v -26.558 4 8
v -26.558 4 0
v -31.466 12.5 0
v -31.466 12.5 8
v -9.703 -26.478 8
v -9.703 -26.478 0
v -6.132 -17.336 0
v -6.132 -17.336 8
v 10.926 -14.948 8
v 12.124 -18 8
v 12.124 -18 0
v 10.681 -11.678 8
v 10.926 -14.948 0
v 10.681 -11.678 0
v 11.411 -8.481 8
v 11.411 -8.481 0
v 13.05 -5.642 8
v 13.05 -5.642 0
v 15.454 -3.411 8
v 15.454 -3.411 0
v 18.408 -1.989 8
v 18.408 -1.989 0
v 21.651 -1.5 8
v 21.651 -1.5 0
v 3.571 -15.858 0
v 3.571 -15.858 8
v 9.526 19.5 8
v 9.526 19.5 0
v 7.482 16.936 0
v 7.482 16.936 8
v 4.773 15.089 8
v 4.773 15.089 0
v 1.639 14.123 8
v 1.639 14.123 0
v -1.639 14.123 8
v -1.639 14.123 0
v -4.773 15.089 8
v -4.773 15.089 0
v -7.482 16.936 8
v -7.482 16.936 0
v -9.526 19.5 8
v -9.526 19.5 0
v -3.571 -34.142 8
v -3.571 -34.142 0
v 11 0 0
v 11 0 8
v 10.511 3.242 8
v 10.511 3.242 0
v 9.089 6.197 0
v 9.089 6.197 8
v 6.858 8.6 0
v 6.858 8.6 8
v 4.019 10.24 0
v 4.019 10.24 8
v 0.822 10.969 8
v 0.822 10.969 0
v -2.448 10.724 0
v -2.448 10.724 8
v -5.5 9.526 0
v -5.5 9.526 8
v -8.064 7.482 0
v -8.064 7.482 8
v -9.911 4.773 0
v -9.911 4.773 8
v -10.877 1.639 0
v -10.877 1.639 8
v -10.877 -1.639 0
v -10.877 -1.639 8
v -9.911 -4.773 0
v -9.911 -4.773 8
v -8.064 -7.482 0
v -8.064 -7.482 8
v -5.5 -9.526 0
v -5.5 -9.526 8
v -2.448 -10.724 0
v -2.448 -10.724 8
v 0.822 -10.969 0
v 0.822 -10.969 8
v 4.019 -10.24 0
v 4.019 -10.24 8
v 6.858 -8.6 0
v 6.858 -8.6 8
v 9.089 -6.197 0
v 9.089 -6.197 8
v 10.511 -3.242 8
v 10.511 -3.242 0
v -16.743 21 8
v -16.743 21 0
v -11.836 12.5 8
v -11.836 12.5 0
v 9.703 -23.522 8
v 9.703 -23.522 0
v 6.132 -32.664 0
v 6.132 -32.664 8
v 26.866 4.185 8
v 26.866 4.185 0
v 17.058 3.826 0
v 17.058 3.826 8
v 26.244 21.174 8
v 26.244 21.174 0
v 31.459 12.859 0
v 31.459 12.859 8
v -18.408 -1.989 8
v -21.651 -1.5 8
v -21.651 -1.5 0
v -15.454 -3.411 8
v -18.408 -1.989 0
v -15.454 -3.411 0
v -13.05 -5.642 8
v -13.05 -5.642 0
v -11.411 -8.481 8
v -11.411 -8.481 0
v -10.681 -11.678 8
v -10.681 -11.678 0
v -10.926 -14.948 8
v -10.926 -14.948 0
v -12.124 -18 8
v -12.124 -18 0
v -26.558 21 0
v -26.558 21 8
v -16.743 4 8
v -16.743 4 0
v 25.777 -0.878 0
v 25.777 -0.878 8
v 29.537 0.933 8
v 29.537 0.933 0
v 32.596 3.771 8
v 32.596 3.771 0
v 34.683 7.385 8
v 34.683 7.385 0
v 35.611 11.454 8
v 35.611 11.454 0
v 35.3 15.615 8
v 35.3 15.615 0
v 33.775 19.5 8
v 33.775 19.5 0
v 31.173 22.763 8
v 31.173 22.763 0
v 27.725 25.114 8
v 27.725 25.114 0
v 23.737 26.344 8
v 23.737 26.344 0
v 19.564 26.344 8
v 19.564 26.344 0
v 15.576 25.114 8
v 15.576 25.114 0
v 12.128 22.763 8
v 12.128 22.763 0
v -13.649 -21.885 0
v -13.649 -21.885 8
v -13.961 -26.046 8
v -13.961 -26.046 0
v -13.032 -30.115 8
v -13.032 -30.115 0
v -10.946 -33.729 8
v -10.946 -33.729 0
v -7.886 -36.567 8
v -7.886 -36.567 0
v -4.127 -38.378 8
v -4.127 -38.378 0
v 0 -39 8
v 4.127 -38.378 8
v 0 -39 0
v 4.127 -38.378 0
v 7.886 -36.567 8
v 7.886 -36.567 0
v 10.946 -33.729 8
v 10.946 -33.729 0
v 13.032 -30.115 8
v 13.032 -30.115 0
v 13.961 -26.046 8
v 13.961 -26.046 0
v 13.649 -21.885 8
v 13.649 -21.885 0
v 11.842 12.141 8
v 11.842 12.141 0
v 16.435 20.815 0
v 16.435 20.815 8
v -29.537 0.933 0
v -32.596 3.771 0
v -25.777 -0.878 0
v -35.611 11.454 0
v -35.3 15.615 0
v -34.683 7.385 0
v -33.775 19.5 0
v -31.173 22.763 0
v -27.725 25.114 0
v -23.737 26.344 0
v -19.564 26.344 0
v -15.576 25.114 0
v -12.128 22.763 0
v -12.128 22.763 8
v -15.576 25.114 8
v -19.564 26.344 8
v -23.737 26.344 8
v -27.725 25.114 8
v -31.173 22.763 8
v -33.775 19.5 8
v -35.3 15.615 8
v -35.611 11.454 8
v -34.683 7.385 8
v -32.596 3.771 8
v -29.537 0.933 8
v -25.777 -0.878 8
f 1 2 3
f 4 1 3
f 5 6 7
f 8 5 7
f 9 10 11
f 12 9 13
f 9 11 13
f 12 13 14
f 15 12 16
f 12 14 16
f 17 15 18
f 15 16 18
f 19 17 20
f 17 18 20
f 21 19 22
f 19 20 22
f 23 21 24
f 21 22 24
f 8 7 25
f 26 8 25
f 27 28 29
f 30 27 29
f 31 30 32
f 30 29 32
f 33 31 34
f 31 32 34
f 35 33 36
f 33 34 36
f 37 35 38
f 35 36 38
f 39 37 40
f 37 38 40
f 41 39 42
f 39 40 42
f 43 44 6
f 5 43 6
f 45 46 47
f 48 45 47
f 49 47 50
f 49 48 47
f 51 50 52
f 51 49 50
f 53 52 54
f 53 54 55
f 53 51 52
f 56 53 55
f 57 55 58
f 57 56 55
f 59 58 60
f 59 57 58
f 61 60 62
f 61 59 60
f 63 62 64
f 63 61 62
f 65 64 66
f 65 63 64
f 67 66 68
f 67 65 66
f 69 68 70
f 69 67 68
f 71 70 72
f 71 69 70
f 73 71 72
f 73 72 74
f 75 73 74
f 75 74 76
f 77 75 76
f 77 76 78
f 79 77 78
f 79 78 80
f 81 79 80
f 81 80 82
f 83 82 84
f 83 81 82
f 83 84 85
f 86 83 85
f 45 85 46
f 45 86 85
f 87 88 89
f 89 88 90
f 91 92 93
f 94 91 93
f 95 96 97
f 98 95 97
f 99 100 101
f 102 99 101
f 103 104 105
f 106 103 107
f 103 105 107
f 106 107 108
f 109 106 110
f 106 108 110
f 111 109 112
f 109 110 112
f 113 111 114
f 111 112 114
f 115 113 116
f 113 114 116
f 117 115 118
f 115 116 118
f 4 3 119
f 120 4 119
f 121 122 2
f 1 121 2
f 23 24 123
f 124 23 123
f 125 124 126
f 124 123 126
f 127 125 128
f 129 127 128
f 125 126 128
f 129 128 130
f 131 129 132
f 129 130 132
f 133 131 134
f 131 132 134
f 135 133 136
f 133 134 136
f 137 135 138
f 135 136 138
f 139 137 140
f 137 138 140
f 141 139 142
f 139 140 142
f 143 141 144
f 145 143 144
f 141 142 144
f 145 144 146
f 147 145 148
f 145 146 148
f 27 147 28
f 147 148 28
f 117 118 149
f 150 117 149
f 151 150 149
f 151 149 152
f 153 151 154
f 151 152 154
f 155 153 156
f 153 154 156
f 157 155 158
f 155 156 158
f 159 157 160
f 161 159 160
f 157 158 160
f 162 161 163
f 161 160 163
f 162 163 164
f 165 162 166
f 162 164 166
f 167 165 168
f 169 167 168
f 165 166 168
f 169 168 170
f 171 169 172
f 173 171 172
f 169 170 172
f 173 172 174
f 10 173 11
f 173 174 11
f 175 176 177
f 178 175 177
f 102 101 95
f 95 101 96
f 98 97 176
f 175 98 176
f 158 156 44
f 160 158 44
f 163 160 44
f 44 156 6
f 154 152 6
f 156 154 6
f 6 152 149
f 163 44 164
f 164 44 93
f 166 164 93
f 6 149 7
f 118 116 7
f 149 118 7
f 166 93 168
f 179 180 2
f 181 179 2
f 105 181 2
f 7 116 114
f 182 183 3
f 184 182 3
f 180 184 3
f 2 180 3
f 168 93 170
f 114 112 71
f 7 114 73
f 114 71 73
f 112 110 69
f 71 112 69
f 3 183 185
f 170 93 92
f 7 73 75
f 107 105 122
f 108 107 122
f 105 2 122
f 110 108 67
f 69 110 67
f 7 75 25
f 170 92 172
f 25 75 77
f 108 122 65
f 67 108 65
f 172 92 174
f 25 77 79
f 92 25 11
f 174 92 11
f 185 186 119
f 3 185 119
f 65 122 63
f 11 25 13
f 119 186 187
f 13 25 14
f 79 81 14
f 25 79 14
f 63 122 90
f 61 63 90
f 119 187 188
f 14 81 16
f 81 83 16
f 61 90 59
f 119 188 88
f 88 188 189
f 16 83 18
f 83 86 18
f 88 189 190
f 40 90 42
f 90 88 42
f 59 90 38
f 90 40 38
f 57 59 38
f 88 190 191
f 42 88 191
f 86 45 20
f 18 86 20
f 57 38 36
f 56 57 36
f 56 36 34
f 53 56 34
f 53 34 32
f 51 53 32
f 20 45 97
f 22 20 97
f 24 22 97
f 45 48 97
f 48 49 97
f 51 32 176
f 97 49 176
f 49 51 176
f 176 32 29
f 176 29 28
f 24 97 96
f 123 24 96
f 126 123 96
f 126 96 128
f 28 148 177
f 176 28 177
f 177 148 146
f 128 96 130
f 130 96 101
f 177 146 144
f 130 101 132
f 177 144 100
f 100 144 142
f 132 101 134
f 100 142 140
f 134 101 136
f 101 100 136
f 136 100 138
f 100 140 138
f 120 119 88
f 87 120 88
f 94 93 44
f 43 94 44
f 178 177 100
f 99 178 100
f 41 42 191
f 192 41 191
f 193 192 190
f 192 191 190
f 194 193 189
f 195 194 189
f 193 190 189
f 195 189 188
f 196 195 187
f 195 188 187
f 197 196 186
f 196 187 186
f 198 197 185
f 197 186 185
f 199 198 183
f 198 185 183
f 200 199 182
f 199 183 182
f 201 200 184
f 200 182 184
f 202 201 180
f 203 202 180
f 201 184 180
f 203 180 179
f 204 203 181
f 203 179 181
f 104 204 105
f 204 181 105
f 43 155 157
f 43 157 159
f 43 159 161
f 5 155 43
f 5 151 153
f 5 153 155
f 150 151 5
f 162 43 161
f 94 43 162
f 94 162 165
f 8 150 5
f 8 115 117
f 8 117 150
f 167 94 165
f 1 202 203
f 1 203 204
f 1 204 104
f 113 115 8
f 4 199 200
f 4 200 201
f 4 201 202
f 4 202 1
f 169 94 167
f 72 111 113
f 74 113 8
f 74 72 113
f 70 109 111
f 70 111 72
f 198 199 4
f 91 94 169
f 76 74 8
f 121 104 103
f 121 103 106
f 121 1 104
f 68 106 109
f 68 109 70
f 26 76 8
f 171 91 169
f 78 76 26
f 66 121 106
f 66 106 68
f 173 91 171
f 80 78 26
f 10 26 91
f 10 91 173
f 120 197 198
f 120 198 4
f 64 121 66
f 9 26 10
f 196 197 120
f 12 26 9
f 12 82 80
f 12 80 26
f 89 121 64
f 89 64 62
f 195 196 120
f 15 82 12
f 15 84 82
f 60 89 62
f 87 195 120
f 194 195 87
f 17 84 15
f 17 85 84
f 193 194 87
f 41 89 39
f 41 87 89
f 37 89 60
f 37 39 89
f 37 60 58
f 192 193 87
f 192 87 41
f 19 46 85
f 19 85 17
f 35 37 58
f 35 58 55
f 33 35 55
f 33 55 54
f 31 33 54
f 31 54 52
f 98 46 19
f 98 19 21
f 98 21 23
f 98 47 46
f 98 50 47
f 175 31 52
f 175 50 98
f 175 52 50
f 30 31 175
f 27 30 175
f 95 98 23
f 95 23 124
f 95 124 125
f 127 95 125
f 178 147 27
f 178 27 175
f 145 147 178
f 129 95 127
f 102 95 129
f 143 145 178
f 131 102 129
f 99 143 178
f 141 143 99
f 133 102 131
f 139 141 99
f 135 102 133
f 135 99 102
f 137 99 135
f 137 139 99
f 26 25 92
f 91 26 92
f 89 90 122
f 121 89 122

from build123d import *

# Parameters (mm, degrees)
F0_R     = 11
F1_DEPTH = 8


with BuildPart() as f1:
    # F0 (on Top) → F1 (new body)
    with BuildSketch(Plane.XY):
        with BuildLine():
            ThreePointArc((9.526279, 19.5), (0, 14), (-9.526279, 19.5))
            ThreePointArc((-9.526279, 19.5), (-33.774991, 19.5), (-21.650635, -1.5))
            ThreePointArc((-21.650635, -1.5), (-12.124356, -7), (-12.124356, -18))
            ThreePointArc((-12.124356, -18), (0, -39), (12.124356, -18))
            ThreePointArc((12.124356, -18), (12.124356, -7), (21.650635, -1.5))
            ThreePointArc((21.650635, -1.5), (33.774991, 19.5), (9.526279, 19.5))
        make_face()
        Polygon((3.57134, -15.857852), (9.703002, -23.521797), (6.131662, -32.663945), (-3.57134, -34.142148), (-9.703002, -26.478203), (-6.131662, -17.336055), align=None, mode=Mode.SUBTRACT)
        Polygon((-16.743158, 21), (-11.835681, 12.5), (-16.743158, 4), (-26.558112, 4), (-31.46559, 12.5), (-26.558112, 21), align=None, mode=Mode.SUBTRACT)
        Circle(F0_R, mode=Mode.SUBTRACT)
        Polygon((16.435203, 20.814602), (26.243575, 21.173997), (31.459007, 12.859396), (26.866067, 4.185398), (17.057695, 3.826003), (11.842263, 12.140604), align=None, mode=Mode.SUBTRACT)
    extrude(amount=F1_DEPTH)


solid = f1.part
